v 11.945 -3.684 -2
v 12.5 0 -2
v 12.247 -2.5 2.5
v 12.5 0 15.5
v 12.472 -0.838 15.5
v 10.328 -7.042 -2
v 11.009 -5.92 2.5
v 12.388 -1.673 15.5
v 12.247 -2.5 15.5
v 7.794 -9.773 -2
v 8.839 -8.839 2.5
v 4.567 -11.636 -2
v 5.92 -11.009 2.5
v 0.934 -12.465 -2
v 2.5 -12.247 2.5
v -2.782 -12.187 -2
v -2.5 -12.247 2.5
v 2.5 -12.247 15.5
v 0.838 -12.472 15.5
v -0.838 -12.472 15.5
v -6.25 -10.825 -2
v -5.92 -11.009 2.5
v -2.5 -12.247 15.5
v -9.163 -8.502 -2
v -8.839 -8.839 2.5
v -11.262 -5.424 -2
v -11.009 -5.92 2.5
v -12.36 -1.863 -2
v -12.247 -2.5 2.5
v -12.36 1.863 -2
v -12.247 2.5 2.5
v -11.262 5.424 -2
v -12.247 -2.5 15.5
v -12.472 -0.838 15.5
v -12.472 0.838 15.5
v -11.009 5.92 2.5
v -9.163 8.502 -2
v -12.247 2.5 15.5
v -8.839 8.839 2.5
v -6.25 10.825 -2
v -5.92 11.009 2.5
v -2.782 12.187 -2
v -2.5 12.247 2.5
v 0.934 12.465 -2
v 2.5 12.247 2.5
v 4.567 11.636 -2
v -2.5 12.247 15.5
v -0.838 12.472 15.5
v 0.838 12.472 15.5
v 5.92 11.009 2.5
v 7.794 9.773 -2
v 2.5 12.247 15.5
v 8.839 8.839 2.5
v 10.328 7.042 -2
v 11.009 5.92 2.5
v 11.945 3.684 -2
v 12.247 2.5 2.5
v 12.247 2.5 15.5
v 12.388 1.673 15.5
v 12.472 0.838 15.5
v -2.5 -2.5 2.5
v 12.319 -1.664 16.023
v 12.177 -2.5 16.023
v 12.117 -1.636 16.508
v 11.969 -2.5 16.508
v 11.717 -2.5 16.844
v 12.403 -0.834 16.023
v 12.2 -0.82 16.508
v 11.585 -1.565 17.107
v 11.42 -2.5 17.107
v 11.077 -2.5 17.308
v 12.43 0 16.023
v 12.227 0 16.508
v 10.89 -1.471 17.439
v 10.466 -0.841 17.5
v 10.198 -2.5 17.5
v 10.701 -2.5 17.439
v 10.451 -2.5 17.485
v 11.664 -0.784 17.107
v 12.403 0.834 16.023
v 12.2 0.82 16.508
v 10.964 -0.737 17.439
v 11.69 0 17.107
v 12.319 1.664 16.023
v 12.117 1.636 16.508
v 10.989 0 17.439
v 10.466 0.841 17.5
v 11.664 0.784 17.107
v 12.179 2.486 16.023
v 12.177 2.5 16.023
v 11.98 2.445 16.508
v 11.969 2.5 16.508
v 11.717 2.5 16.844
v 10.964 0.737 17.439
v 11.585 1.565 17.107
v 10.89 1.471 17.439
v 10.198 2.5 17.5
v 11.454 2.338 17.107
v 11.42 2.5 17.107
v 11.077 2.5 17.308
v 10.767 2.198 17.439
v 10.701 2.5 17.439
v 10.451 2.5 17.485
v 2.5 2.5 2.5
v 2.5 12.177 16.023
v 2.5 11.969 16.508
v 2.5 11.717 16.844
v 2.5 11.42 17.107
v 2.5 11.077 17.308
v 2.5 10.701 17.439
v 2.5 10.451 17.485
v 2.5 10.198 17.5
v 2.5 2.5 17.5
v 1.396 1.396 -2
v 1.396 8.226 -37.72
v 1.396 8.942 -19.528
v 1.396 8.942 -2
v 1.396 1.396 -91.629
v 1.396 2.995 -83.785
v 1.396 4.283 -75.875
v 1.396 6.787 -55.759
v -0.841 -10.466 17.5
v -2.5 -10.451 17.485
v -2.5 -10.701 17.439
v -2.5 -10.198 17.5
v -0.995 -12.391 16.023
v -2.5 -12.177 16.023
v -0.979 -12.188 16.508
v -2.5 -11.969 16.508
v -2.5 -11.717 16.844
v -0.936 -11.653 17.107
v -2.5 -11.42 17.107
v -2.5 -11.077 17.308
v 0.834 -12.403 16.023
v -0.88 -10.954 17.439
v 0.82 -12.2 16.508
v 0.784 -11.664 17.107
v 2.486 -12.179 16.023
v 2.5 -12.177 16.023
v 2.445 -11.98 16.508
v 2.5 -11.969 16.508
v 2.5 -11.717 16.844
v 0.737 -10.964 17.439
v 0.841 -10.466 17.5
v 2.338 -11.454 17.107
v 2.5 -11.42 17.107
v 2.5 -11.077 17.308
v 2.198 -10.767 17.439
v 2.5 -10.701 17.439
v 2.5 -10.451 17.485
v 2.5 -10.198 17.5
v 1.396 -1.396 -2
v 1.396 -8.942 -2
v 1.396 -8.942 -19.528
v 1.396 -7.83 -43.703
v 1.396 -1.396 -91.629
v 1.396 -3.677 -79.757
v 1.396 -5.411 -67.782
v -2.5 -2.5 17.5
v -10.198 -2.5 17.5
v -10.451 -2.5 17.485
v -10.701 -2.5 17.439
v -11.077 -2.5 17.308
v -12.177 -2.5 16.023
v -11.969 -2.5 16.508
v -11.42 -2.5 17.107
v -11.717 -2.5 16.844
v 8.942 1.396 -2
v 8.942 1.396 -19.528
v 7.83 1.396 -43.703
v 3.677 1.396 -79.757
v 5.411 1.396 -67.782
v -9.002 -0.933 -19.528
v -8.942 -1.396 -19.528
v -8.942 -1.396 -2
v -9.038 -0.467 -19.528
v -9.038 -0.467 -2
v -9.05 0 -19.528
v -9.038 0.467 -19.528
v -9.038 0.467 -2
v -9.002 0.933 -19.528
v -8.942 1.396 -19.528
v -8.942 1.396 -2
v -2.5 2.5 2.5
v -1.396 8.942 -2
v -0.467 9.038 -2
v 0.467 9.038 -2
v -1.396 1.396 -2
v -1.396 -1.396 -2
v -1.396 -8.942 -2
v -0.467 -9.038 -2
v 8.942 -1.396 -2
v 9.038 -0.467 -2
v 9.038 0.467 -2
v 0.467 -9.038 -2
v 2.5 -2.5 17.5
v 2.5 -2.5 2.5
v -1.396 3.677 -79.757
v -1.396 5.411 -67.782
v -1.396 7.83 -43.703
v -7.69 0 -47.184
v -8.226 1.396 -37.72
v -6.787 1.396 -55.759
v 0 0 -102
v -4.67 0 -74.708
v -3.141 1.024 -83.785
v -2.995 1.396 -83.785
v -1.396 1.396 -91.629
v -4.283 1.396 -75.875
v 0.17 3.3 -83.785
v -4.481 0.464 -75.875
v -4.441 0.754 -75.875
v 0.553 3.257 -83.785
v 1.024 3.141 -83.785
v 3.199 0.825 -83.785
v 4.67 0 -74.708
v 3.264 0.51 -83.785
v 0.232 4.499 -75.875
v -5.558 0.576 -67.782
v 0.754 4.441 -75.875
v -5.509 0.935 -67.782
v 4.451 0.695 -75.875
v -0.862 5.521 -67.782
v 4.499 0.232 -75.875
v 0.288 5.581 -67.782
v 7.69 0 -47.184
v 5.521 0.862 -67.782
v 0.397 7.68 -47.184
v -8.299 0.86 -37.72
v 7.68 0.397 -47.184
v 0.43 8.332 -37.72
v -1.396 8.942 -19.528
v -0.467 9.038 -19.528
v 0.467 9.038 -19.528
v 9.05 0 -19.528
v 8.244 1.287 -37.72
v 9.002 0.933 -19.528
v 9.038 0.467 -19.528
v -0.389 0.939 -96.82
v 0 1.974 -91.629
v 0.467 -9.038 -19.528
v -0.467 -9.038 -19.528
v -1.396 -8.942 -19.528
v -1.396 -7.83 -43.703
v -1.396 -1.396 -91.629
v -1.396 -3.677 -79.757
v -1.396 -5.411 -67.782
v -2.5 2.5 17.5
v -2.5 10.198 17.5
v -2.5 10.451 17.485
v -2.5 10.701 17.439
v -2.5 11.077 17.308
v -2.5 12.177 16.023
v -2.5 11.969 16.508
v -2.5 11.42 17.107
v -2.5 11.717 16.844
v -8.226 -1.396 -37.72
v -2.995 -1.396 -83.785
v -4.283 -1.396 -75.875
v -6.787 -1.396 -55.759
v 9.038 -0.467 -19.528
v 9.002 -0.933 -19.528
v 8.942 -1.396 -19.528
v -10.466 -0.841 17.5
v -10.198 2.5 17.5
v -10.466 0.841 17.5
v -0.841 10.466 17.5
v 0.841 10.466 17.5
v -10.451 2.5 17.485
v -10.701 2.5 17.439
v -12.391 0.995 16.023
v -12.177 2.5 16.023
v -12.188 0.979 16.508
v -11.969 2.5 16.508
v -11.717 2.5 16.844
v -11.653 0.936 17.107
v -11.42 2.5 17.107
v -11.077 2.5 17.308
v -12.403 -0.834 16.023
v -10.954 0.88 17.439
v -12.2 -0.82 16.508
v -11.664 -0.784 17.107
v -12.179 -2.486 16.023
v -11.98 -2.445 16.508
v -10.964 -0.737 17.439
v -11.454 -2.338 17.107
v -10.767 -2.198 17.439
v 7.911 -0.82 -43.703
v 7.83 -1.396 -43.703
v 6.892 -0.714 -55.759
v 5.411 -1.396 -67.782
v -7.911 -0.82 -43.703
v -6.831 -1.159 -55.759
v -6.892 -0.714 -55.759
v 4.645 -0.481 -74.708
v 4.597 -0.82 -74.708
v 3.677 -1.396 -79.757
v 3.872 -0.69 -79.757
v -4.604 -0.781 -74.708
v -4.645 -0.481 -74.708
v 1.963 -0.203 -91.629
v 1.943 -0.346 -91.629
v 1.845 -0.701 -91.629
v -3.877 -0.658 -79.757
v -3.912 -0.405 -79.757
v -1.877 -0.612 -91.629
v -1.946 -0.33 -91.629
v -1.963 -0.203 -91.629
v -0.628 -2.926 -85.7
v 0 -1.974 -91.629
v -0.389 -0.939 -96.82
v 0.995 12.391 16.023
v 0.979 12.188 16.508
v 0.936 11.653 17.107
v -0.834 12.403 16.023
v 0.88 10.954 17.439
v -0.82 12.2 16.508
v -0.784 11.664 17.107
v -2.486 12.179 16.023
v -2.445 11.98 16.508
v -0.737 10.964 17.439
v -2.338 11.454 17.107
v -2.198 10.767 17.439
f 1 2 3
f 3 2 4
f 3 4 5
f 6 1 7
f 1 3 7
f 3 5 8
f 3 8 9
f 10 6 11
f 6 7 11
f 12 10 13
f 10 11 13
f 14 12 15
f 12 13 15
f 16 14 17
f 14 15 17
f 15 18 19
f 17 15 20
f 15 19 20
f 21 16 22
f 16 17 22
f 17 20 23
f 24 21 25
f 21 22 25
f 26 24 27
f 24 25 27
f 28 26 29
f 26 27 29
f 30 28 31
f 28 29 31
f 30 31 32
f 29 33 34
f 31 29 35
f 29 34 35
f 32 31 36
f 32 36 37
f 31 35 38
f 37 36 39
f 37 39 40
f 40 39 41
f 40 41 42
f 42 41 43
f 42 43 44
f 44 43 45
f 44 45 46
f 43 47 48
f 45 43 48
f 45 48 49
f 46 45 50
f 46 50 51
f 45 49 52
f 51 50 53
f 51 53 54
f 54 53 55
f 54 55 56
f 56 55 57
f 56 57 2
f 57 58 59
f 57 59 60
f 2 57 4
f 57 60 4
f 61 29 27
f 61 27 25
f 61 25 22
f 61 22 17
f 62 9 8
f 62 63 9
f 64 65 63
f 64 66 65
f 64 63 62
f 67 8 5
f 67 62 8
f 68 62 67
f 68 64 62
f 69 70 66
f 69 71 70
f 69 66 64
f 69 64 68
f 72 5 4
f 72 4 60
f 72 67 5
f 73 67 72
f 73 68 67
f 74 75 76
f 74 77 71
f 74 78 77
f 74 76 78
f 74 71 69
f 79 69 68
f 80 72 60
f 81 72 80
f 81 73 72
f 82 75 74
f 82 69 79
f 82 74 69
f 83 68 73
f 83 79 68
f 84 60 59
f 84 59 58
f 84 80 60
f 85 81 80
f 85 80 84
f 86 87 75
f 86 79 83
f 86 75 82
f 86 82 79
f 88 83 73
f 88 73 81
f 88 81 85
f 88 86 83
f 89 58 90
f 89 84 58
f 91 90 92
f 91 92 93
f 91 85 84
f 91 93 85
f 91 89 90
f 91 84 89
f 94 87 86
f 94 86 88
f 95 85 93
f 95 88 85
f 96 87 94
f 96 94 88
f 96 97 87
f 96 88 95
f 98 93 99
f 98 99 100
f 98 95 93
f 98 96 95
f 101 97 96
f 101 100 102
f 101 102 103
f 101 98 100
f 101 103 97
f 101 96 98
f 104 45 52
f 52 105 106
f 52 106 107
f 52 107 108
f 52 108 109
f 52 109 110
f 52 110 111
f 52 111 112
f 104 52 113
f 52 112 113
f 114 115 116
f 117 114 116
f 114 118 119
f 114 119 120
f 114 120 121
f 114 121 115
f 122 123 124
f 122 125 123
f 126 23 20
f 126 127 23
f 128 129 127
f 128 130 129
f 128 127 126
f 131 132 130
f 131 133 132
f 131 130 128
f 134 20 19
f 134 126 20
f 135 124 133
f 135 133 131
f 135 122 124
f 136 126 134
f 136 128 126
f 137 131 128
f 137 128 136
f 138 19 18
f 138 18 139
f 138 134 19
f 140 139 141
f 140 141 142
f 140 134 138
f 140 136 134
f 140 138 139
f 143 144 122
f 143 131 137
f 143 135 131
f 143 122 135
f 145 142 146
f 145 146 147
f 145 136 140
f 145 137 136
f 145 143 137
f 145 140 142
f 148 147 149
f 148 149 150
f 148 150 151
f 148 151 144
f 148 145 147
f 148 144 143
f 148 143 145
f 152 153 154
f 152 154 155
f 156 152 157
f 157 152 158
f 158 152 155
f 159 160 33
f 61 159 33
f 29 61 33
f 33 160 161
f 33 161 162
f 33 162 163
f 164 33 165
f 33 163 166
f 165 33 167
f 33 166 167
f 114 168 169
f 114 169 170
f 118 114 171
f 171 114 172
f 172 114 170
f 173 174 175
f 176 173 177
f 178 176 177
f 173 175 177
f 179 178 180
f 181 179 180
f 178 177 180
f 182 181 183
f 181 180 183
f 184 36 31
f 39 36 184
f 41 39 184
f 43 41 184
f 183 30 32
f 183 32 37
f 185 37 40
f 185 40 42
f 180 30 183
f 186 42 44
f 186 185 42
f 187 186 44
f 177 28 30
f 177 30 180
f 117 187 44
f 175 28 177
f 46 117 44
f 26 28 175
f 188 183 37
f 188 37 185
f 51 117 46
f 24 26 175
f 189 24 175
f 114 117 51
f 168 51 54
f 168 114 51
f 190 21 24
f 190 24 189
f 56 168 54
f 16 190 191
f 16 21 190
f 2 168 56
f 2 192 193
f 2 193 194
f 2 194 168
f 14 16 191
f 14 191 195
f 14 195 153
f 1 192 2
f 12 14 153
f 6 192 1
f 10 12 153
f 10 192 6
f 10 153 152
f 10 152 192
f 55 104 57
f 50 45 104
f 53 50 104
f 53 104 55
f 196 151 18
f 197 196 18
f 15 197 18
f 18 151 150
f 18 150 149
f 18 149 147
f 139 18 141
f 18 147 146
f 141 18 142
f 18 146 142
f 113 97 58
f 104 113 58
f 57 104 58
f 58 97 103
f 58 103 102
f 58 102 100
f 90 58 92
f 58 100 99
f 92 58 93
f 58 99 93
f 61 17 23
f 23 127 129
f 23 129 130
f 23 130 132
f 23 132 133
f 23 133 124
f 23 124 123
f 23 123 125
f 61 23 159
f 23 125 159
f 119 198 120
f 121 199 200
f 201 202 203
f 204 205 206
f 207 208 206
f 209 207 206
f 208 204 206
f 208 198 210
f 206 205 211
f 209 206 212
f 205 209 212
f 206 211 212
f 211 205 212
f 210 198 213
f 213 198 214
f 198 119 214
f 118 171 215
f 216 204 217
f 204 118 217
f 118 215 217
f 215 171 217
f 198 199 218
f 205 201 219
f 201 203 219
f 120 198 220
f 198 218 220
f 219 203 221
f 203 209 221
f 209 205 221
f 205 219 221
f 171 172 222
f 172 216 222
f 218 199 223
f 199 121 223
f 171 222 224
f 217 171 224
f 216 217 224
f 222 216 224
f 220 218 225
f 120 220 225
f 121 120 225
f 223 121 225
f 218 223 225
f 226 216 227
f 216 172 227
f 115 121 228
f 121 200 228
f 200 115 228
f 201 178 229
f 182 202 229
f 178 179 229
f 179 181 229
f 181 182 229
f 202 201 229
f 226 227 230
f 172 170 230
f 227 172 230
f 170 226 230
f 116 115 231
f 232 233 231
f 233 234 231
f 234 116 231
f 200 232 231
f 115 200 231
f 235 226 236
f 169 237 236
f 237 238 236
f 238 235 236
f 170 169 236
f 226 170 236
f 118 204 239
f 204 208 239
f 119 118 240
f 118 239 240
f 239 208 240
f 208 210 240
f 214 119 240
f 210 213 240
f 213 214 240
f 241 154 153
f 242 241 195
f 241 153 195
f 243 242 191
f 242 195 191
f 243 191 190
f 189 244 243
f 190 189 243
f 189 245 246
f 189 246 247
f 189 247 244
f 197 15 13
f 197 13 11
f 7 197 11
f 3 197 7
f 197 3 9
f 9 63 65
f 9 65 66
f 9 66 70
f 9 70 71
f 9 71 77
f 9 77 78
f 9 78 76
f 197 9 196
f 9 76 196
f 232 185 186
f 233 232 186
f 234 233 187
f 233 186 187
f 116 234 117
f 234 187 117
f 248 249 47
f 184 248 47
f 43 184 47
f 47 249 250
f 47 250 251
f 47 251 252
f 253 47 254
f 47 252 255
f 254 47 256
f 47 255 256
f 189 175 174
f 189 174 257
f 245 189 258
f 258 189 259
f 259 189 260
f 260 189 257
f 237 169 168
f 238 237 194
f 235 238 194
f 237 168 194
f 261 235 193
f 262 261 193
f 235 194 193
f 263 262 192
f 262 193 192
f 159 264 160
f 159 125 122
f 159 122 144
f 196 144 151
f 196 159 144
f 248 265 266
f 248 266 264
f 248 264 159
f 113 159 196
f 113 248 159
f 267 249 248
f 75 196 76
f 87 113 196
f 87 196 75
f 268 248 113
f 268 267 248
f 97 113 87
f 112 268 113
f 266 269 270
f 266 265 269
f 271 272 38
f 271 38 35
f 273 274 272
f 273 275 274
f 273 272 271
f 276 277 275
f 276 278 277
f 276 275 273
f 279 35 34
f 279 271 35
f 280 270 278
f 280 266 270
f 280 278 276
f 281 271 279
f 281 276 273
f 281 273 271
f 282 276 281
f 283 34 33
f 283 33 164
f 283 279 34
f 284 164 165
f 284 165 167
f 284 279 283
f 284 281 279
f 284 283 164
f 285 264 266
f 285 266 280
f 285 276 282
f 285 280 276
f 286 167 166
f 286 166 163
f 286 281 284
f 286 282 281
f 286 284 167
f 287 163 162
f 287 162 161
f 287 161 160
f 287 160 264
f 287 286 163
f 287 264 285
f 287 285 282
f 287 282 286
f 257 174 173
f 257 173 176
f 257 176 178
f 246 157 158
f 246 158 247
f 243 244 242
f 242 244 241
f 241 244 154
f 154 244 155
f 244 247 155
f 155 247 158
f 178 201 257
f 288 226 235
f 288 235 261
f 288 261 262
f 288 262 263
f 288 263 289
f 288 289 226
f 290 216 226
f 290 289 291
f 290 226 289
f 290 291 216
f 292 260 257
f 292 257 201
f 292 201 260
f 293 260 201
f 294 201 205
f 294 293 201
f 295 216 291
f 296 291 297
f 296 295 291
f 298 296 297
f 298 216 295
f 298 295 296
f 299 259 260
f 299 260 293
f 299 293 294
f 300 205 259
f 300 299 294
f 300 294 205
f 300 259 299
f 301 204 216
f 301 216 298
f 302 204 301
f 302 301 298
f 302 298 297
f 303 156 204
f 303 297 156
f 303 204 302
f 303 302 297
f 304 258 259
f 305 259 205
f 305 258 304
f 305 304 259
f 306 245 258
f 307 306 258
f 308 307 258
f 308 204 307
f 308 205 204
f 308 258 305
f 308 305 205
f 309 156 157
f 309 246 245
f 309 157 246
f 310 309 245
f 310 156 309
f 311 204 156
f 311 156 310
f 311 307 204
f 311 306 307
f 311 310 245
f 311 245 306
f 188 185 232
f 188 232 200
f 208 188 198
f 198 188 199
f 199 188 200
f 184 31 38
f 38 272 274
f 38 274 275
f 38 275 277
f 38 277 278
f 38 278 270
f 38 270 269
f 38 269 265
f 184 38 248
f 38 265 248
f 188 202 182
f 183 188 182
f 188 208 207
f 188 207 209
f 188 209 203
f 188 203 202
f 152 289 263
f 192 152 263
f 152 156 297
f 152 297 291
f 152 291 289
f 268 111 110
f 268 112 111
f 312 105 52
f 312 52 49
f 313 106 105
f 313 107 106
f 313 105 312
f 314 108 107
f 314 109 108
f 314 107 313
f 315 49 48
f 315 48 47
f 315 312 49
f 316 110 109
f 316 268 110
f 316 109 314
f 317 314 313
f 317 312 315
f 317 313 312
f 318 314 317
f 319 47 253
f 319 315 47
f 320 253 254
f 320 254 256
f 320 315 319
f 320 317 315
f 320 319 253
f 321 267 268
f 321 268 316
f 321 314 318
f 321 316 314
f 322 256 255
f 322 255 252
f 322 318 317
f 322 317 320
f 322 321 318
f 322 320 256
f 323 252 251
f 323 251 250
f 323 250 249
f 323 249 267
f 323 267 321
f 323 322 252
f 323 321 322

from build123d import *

# Parameters (mm, degrees)
F0_R      = 12.5
F1_DEPTH  = 17.5
F2_R      = 2
F3_R      = 12.5
F4_DEPTH  = 2
F5_R      = 9.05
F6_DEPTH  = 100
F8_ANGLE  = 180
F10_DEPTH = 100.001
F12_DEPTH = 15


with BuildPart() as f1:
    # F0 (on Top) → F1 (new body)
    with BuildSketch(Plane.XY):
        Circle(F0_R)
    extrude(amount=F1_DEPTH)

    # F2
    f2_edges = [f1.edges().sort_by_distance(p)[0] for p in [
        (-12.5, 0, 17.5),
    ]]
    fillet(f2_edges, radius=F2_R)

    # F3 (on face) → F4 (join)
    with BuildSketch(Plane(origin=(0, 0, 0), x_dir=(1, 0, 0), z_dir=(0, 0, -1))):
        Circle(F3_R)
    extrude(amount=F4_DEPTH)

    # F5 (on face) → F6 (join)
    with BuildSketch(Plane(origin=(0, 0, -2), x_dir=(1, 0, 0), z_dir=(0, 0, -1))):
        Circle(F5_R)
    extrude(amount=F6_DEPTH)

    # F7 (on Front) → F8 (revolve, cut)
    with BuildSketch(Plane.XZ):
        with BuildLine():
            Line((-9.05, -19.527881), (-9.05, -2))
            ThreePointArc((-9.05, -2), (-9.133447, -10.763941), (-9.05, -19.527881))
        make_face()
        with BuildLine():
            Line((9.05, -2), (9.05, -19.527881))
            ThreePointArc((9.05, -19.527881), (9.133447, -10.763941), (9.05, -2))
        make_face()
        with BuildLine():
            ThreePointArc((9.05, -19.527881), (6.387127, -60.968279), (0, -102))
            Line((0, -102), (9.05, -102))
            Line((9.05, -102), (9.05, -19.527881))
        make_face()
        with BuildLine():
            ThreePointArc((0, -102), (-6.387127, -60.968279), (-9.05, -19.527881))
            Line((-9.05, -19.527881), (-9.05, -102))
            Line((-9.05, -102), (0, -102))
        make_face()
    revolve(axis=Axis((0, 0, -52), (0, 0, -1)), revolution_arc=F8_ANGLE, mode=Mode.SUBTRACT)

    # F9 (on face) → F10 (cut, through all)
    with BuildSketch(Plane(origin=(0, 0, -2), x_dir=(1, 0, 0), z_dir=(0, 0, -1))):
        Polygon((-1.395766, -12.419861), (-1.395766, -7.419861), (-1.395766, -1.395766), (-7.419861, -1.395766), (-12.419861, -1.395766), align=None)
        Polygon((-12.419861, 1.395766), (-7.419861, 1.395766), (-1.395766, 1.395766), (-1.395766, 7.419861), (-1.395766, 12.419861), align=None)
        Polygon((1.395766, 12.419861), (1.395766, 7.419861), (1.395766, 1.395766), (7.419861, 1.395766), (12.419861, 1.395766), align=None)
        Polygon((12.419861, -1.395766), (7.419861, -1.395766), (1.395766, -1.395766), (1.395766, -7.419861), (1.395766, -12.419861), align=None)
    extrude(amount=F10_DEPTH, mode=Mode.SUBTRACT)

    # F11 (on face) → F12 (cut)
    with BuildSketch(Plane.XY.offset(17.5)):
        with BuildLine():
            Line((-2.5, -2.5), (-10.198039, -2.5))
            ThreePointArc((-10.198039, -2.5), (-7.424621, -7.424621), (-2.5, -10.198039))
            Line((-2.5, -10.198039), (-2.5, -2.5))
        make_face()
        with BuildLine():
            ThreePointArc((-2.5, -10.198039), (-7.424621, -7.424621), (-10.198039, -2.5))
            Line((-10.198039, -2.5), (-12.067753, -2.5))
            Line((-12.067753, -2.5), (-13.370921, -2.5))
            ThreePointArc((-13.370921, -2.5), (-9.618512, -9.618512), (-2.5, -13.370921))
            Line((-2.5, -13.370921), (-2.5, -10.63198))
            Line((-2.5, -10.63198), (-2.5, -10.198039))
        make_face()
        with BuildLine():
            ThreePointArc((10.198039, 2.5), (7.424621, 7.424621), (2.5, 10.198039))
            Line((2.5, 10.198039), (2.5, 2.5))
            Line((2.5, 2.5), (10.198039, 2.5))
        make_face()
        with BuildLine():
            Line((2.5, 10.63198), (2.5, 10.198039))
            ThreePointArc((2.5, 10.198039), (7.424621, 7.424621), (10.198039, 2.5))
            Line((10.198039, 2.5), (10.63198, 2.5))
            Line((10.63198, 2.5), (13.370921, 2.5))
            ThreePointArc((13.370921, 2.5), (9.618512, 9.618512), (2.5, 13.370921))
            Line((2.5, 13.370921), (2.5, 10.63198))
        make_face()
        with BuildLine():
            ThreePointArc((2.5, -10.198039), (7.424621, -7.424621), (10.198039, -2.5))
            Line((10.198039, -2.5), (2.5, -2.5))
            Line((2.5, -2.5), (2.5, -10.198039))
        make_face()
        with BuildLine():
            Line((10.63198, -2.5), (10.198039, -2.5))
            ThreePointArc((10.198039, -2.5), (7.424621, -7.424621), (2.5, -10.198039))
            Line((2.5, -10.198039), (2.5, -10.63198))
            Line((2.5, -10.63198), (2.5, -13.370921))
            ThreePointArc((2.5, -13.370921), (9.618512, -9.618512), (13.370921, -2.5))
            Line((13.370921, -2.5), (10.63198, -2.5))
        make_face()
        with BuildLine():
            Line((-2.5, 10.198039), (-2.5, 10.63198))
            Line((-2.5, 10.63198), (-2.5, 13.370921))
            ThreePointArc((-2.5, 13.370921), (-9.618512, 9.618512), (-13.370921, 2.5))
            Line((-13.370921, 2.5), (-10.63198, 2.5))
            Line((-10.63198, 2.5), (-10.198039, 2.5))
            ThreePointArc((-10.198039, 2.5), (-7.424621, 7.424621), (-2.5, 10.198039))
        make_face()
        with BuildLine():
            Line((-2.5, 2.5), (-2.5, 10.198039))
            ThreePointArc((-2.5, 10.198039), (-7.424621, 7.424621), (-10.198039, 2.5))
            Line((-10.198039, 2.5), (-2.5, 2.5))
        make_face()
    extrude(amount=-F12_DEPTH, mode=Mode.SUBTRACT)


solid = f1.part
